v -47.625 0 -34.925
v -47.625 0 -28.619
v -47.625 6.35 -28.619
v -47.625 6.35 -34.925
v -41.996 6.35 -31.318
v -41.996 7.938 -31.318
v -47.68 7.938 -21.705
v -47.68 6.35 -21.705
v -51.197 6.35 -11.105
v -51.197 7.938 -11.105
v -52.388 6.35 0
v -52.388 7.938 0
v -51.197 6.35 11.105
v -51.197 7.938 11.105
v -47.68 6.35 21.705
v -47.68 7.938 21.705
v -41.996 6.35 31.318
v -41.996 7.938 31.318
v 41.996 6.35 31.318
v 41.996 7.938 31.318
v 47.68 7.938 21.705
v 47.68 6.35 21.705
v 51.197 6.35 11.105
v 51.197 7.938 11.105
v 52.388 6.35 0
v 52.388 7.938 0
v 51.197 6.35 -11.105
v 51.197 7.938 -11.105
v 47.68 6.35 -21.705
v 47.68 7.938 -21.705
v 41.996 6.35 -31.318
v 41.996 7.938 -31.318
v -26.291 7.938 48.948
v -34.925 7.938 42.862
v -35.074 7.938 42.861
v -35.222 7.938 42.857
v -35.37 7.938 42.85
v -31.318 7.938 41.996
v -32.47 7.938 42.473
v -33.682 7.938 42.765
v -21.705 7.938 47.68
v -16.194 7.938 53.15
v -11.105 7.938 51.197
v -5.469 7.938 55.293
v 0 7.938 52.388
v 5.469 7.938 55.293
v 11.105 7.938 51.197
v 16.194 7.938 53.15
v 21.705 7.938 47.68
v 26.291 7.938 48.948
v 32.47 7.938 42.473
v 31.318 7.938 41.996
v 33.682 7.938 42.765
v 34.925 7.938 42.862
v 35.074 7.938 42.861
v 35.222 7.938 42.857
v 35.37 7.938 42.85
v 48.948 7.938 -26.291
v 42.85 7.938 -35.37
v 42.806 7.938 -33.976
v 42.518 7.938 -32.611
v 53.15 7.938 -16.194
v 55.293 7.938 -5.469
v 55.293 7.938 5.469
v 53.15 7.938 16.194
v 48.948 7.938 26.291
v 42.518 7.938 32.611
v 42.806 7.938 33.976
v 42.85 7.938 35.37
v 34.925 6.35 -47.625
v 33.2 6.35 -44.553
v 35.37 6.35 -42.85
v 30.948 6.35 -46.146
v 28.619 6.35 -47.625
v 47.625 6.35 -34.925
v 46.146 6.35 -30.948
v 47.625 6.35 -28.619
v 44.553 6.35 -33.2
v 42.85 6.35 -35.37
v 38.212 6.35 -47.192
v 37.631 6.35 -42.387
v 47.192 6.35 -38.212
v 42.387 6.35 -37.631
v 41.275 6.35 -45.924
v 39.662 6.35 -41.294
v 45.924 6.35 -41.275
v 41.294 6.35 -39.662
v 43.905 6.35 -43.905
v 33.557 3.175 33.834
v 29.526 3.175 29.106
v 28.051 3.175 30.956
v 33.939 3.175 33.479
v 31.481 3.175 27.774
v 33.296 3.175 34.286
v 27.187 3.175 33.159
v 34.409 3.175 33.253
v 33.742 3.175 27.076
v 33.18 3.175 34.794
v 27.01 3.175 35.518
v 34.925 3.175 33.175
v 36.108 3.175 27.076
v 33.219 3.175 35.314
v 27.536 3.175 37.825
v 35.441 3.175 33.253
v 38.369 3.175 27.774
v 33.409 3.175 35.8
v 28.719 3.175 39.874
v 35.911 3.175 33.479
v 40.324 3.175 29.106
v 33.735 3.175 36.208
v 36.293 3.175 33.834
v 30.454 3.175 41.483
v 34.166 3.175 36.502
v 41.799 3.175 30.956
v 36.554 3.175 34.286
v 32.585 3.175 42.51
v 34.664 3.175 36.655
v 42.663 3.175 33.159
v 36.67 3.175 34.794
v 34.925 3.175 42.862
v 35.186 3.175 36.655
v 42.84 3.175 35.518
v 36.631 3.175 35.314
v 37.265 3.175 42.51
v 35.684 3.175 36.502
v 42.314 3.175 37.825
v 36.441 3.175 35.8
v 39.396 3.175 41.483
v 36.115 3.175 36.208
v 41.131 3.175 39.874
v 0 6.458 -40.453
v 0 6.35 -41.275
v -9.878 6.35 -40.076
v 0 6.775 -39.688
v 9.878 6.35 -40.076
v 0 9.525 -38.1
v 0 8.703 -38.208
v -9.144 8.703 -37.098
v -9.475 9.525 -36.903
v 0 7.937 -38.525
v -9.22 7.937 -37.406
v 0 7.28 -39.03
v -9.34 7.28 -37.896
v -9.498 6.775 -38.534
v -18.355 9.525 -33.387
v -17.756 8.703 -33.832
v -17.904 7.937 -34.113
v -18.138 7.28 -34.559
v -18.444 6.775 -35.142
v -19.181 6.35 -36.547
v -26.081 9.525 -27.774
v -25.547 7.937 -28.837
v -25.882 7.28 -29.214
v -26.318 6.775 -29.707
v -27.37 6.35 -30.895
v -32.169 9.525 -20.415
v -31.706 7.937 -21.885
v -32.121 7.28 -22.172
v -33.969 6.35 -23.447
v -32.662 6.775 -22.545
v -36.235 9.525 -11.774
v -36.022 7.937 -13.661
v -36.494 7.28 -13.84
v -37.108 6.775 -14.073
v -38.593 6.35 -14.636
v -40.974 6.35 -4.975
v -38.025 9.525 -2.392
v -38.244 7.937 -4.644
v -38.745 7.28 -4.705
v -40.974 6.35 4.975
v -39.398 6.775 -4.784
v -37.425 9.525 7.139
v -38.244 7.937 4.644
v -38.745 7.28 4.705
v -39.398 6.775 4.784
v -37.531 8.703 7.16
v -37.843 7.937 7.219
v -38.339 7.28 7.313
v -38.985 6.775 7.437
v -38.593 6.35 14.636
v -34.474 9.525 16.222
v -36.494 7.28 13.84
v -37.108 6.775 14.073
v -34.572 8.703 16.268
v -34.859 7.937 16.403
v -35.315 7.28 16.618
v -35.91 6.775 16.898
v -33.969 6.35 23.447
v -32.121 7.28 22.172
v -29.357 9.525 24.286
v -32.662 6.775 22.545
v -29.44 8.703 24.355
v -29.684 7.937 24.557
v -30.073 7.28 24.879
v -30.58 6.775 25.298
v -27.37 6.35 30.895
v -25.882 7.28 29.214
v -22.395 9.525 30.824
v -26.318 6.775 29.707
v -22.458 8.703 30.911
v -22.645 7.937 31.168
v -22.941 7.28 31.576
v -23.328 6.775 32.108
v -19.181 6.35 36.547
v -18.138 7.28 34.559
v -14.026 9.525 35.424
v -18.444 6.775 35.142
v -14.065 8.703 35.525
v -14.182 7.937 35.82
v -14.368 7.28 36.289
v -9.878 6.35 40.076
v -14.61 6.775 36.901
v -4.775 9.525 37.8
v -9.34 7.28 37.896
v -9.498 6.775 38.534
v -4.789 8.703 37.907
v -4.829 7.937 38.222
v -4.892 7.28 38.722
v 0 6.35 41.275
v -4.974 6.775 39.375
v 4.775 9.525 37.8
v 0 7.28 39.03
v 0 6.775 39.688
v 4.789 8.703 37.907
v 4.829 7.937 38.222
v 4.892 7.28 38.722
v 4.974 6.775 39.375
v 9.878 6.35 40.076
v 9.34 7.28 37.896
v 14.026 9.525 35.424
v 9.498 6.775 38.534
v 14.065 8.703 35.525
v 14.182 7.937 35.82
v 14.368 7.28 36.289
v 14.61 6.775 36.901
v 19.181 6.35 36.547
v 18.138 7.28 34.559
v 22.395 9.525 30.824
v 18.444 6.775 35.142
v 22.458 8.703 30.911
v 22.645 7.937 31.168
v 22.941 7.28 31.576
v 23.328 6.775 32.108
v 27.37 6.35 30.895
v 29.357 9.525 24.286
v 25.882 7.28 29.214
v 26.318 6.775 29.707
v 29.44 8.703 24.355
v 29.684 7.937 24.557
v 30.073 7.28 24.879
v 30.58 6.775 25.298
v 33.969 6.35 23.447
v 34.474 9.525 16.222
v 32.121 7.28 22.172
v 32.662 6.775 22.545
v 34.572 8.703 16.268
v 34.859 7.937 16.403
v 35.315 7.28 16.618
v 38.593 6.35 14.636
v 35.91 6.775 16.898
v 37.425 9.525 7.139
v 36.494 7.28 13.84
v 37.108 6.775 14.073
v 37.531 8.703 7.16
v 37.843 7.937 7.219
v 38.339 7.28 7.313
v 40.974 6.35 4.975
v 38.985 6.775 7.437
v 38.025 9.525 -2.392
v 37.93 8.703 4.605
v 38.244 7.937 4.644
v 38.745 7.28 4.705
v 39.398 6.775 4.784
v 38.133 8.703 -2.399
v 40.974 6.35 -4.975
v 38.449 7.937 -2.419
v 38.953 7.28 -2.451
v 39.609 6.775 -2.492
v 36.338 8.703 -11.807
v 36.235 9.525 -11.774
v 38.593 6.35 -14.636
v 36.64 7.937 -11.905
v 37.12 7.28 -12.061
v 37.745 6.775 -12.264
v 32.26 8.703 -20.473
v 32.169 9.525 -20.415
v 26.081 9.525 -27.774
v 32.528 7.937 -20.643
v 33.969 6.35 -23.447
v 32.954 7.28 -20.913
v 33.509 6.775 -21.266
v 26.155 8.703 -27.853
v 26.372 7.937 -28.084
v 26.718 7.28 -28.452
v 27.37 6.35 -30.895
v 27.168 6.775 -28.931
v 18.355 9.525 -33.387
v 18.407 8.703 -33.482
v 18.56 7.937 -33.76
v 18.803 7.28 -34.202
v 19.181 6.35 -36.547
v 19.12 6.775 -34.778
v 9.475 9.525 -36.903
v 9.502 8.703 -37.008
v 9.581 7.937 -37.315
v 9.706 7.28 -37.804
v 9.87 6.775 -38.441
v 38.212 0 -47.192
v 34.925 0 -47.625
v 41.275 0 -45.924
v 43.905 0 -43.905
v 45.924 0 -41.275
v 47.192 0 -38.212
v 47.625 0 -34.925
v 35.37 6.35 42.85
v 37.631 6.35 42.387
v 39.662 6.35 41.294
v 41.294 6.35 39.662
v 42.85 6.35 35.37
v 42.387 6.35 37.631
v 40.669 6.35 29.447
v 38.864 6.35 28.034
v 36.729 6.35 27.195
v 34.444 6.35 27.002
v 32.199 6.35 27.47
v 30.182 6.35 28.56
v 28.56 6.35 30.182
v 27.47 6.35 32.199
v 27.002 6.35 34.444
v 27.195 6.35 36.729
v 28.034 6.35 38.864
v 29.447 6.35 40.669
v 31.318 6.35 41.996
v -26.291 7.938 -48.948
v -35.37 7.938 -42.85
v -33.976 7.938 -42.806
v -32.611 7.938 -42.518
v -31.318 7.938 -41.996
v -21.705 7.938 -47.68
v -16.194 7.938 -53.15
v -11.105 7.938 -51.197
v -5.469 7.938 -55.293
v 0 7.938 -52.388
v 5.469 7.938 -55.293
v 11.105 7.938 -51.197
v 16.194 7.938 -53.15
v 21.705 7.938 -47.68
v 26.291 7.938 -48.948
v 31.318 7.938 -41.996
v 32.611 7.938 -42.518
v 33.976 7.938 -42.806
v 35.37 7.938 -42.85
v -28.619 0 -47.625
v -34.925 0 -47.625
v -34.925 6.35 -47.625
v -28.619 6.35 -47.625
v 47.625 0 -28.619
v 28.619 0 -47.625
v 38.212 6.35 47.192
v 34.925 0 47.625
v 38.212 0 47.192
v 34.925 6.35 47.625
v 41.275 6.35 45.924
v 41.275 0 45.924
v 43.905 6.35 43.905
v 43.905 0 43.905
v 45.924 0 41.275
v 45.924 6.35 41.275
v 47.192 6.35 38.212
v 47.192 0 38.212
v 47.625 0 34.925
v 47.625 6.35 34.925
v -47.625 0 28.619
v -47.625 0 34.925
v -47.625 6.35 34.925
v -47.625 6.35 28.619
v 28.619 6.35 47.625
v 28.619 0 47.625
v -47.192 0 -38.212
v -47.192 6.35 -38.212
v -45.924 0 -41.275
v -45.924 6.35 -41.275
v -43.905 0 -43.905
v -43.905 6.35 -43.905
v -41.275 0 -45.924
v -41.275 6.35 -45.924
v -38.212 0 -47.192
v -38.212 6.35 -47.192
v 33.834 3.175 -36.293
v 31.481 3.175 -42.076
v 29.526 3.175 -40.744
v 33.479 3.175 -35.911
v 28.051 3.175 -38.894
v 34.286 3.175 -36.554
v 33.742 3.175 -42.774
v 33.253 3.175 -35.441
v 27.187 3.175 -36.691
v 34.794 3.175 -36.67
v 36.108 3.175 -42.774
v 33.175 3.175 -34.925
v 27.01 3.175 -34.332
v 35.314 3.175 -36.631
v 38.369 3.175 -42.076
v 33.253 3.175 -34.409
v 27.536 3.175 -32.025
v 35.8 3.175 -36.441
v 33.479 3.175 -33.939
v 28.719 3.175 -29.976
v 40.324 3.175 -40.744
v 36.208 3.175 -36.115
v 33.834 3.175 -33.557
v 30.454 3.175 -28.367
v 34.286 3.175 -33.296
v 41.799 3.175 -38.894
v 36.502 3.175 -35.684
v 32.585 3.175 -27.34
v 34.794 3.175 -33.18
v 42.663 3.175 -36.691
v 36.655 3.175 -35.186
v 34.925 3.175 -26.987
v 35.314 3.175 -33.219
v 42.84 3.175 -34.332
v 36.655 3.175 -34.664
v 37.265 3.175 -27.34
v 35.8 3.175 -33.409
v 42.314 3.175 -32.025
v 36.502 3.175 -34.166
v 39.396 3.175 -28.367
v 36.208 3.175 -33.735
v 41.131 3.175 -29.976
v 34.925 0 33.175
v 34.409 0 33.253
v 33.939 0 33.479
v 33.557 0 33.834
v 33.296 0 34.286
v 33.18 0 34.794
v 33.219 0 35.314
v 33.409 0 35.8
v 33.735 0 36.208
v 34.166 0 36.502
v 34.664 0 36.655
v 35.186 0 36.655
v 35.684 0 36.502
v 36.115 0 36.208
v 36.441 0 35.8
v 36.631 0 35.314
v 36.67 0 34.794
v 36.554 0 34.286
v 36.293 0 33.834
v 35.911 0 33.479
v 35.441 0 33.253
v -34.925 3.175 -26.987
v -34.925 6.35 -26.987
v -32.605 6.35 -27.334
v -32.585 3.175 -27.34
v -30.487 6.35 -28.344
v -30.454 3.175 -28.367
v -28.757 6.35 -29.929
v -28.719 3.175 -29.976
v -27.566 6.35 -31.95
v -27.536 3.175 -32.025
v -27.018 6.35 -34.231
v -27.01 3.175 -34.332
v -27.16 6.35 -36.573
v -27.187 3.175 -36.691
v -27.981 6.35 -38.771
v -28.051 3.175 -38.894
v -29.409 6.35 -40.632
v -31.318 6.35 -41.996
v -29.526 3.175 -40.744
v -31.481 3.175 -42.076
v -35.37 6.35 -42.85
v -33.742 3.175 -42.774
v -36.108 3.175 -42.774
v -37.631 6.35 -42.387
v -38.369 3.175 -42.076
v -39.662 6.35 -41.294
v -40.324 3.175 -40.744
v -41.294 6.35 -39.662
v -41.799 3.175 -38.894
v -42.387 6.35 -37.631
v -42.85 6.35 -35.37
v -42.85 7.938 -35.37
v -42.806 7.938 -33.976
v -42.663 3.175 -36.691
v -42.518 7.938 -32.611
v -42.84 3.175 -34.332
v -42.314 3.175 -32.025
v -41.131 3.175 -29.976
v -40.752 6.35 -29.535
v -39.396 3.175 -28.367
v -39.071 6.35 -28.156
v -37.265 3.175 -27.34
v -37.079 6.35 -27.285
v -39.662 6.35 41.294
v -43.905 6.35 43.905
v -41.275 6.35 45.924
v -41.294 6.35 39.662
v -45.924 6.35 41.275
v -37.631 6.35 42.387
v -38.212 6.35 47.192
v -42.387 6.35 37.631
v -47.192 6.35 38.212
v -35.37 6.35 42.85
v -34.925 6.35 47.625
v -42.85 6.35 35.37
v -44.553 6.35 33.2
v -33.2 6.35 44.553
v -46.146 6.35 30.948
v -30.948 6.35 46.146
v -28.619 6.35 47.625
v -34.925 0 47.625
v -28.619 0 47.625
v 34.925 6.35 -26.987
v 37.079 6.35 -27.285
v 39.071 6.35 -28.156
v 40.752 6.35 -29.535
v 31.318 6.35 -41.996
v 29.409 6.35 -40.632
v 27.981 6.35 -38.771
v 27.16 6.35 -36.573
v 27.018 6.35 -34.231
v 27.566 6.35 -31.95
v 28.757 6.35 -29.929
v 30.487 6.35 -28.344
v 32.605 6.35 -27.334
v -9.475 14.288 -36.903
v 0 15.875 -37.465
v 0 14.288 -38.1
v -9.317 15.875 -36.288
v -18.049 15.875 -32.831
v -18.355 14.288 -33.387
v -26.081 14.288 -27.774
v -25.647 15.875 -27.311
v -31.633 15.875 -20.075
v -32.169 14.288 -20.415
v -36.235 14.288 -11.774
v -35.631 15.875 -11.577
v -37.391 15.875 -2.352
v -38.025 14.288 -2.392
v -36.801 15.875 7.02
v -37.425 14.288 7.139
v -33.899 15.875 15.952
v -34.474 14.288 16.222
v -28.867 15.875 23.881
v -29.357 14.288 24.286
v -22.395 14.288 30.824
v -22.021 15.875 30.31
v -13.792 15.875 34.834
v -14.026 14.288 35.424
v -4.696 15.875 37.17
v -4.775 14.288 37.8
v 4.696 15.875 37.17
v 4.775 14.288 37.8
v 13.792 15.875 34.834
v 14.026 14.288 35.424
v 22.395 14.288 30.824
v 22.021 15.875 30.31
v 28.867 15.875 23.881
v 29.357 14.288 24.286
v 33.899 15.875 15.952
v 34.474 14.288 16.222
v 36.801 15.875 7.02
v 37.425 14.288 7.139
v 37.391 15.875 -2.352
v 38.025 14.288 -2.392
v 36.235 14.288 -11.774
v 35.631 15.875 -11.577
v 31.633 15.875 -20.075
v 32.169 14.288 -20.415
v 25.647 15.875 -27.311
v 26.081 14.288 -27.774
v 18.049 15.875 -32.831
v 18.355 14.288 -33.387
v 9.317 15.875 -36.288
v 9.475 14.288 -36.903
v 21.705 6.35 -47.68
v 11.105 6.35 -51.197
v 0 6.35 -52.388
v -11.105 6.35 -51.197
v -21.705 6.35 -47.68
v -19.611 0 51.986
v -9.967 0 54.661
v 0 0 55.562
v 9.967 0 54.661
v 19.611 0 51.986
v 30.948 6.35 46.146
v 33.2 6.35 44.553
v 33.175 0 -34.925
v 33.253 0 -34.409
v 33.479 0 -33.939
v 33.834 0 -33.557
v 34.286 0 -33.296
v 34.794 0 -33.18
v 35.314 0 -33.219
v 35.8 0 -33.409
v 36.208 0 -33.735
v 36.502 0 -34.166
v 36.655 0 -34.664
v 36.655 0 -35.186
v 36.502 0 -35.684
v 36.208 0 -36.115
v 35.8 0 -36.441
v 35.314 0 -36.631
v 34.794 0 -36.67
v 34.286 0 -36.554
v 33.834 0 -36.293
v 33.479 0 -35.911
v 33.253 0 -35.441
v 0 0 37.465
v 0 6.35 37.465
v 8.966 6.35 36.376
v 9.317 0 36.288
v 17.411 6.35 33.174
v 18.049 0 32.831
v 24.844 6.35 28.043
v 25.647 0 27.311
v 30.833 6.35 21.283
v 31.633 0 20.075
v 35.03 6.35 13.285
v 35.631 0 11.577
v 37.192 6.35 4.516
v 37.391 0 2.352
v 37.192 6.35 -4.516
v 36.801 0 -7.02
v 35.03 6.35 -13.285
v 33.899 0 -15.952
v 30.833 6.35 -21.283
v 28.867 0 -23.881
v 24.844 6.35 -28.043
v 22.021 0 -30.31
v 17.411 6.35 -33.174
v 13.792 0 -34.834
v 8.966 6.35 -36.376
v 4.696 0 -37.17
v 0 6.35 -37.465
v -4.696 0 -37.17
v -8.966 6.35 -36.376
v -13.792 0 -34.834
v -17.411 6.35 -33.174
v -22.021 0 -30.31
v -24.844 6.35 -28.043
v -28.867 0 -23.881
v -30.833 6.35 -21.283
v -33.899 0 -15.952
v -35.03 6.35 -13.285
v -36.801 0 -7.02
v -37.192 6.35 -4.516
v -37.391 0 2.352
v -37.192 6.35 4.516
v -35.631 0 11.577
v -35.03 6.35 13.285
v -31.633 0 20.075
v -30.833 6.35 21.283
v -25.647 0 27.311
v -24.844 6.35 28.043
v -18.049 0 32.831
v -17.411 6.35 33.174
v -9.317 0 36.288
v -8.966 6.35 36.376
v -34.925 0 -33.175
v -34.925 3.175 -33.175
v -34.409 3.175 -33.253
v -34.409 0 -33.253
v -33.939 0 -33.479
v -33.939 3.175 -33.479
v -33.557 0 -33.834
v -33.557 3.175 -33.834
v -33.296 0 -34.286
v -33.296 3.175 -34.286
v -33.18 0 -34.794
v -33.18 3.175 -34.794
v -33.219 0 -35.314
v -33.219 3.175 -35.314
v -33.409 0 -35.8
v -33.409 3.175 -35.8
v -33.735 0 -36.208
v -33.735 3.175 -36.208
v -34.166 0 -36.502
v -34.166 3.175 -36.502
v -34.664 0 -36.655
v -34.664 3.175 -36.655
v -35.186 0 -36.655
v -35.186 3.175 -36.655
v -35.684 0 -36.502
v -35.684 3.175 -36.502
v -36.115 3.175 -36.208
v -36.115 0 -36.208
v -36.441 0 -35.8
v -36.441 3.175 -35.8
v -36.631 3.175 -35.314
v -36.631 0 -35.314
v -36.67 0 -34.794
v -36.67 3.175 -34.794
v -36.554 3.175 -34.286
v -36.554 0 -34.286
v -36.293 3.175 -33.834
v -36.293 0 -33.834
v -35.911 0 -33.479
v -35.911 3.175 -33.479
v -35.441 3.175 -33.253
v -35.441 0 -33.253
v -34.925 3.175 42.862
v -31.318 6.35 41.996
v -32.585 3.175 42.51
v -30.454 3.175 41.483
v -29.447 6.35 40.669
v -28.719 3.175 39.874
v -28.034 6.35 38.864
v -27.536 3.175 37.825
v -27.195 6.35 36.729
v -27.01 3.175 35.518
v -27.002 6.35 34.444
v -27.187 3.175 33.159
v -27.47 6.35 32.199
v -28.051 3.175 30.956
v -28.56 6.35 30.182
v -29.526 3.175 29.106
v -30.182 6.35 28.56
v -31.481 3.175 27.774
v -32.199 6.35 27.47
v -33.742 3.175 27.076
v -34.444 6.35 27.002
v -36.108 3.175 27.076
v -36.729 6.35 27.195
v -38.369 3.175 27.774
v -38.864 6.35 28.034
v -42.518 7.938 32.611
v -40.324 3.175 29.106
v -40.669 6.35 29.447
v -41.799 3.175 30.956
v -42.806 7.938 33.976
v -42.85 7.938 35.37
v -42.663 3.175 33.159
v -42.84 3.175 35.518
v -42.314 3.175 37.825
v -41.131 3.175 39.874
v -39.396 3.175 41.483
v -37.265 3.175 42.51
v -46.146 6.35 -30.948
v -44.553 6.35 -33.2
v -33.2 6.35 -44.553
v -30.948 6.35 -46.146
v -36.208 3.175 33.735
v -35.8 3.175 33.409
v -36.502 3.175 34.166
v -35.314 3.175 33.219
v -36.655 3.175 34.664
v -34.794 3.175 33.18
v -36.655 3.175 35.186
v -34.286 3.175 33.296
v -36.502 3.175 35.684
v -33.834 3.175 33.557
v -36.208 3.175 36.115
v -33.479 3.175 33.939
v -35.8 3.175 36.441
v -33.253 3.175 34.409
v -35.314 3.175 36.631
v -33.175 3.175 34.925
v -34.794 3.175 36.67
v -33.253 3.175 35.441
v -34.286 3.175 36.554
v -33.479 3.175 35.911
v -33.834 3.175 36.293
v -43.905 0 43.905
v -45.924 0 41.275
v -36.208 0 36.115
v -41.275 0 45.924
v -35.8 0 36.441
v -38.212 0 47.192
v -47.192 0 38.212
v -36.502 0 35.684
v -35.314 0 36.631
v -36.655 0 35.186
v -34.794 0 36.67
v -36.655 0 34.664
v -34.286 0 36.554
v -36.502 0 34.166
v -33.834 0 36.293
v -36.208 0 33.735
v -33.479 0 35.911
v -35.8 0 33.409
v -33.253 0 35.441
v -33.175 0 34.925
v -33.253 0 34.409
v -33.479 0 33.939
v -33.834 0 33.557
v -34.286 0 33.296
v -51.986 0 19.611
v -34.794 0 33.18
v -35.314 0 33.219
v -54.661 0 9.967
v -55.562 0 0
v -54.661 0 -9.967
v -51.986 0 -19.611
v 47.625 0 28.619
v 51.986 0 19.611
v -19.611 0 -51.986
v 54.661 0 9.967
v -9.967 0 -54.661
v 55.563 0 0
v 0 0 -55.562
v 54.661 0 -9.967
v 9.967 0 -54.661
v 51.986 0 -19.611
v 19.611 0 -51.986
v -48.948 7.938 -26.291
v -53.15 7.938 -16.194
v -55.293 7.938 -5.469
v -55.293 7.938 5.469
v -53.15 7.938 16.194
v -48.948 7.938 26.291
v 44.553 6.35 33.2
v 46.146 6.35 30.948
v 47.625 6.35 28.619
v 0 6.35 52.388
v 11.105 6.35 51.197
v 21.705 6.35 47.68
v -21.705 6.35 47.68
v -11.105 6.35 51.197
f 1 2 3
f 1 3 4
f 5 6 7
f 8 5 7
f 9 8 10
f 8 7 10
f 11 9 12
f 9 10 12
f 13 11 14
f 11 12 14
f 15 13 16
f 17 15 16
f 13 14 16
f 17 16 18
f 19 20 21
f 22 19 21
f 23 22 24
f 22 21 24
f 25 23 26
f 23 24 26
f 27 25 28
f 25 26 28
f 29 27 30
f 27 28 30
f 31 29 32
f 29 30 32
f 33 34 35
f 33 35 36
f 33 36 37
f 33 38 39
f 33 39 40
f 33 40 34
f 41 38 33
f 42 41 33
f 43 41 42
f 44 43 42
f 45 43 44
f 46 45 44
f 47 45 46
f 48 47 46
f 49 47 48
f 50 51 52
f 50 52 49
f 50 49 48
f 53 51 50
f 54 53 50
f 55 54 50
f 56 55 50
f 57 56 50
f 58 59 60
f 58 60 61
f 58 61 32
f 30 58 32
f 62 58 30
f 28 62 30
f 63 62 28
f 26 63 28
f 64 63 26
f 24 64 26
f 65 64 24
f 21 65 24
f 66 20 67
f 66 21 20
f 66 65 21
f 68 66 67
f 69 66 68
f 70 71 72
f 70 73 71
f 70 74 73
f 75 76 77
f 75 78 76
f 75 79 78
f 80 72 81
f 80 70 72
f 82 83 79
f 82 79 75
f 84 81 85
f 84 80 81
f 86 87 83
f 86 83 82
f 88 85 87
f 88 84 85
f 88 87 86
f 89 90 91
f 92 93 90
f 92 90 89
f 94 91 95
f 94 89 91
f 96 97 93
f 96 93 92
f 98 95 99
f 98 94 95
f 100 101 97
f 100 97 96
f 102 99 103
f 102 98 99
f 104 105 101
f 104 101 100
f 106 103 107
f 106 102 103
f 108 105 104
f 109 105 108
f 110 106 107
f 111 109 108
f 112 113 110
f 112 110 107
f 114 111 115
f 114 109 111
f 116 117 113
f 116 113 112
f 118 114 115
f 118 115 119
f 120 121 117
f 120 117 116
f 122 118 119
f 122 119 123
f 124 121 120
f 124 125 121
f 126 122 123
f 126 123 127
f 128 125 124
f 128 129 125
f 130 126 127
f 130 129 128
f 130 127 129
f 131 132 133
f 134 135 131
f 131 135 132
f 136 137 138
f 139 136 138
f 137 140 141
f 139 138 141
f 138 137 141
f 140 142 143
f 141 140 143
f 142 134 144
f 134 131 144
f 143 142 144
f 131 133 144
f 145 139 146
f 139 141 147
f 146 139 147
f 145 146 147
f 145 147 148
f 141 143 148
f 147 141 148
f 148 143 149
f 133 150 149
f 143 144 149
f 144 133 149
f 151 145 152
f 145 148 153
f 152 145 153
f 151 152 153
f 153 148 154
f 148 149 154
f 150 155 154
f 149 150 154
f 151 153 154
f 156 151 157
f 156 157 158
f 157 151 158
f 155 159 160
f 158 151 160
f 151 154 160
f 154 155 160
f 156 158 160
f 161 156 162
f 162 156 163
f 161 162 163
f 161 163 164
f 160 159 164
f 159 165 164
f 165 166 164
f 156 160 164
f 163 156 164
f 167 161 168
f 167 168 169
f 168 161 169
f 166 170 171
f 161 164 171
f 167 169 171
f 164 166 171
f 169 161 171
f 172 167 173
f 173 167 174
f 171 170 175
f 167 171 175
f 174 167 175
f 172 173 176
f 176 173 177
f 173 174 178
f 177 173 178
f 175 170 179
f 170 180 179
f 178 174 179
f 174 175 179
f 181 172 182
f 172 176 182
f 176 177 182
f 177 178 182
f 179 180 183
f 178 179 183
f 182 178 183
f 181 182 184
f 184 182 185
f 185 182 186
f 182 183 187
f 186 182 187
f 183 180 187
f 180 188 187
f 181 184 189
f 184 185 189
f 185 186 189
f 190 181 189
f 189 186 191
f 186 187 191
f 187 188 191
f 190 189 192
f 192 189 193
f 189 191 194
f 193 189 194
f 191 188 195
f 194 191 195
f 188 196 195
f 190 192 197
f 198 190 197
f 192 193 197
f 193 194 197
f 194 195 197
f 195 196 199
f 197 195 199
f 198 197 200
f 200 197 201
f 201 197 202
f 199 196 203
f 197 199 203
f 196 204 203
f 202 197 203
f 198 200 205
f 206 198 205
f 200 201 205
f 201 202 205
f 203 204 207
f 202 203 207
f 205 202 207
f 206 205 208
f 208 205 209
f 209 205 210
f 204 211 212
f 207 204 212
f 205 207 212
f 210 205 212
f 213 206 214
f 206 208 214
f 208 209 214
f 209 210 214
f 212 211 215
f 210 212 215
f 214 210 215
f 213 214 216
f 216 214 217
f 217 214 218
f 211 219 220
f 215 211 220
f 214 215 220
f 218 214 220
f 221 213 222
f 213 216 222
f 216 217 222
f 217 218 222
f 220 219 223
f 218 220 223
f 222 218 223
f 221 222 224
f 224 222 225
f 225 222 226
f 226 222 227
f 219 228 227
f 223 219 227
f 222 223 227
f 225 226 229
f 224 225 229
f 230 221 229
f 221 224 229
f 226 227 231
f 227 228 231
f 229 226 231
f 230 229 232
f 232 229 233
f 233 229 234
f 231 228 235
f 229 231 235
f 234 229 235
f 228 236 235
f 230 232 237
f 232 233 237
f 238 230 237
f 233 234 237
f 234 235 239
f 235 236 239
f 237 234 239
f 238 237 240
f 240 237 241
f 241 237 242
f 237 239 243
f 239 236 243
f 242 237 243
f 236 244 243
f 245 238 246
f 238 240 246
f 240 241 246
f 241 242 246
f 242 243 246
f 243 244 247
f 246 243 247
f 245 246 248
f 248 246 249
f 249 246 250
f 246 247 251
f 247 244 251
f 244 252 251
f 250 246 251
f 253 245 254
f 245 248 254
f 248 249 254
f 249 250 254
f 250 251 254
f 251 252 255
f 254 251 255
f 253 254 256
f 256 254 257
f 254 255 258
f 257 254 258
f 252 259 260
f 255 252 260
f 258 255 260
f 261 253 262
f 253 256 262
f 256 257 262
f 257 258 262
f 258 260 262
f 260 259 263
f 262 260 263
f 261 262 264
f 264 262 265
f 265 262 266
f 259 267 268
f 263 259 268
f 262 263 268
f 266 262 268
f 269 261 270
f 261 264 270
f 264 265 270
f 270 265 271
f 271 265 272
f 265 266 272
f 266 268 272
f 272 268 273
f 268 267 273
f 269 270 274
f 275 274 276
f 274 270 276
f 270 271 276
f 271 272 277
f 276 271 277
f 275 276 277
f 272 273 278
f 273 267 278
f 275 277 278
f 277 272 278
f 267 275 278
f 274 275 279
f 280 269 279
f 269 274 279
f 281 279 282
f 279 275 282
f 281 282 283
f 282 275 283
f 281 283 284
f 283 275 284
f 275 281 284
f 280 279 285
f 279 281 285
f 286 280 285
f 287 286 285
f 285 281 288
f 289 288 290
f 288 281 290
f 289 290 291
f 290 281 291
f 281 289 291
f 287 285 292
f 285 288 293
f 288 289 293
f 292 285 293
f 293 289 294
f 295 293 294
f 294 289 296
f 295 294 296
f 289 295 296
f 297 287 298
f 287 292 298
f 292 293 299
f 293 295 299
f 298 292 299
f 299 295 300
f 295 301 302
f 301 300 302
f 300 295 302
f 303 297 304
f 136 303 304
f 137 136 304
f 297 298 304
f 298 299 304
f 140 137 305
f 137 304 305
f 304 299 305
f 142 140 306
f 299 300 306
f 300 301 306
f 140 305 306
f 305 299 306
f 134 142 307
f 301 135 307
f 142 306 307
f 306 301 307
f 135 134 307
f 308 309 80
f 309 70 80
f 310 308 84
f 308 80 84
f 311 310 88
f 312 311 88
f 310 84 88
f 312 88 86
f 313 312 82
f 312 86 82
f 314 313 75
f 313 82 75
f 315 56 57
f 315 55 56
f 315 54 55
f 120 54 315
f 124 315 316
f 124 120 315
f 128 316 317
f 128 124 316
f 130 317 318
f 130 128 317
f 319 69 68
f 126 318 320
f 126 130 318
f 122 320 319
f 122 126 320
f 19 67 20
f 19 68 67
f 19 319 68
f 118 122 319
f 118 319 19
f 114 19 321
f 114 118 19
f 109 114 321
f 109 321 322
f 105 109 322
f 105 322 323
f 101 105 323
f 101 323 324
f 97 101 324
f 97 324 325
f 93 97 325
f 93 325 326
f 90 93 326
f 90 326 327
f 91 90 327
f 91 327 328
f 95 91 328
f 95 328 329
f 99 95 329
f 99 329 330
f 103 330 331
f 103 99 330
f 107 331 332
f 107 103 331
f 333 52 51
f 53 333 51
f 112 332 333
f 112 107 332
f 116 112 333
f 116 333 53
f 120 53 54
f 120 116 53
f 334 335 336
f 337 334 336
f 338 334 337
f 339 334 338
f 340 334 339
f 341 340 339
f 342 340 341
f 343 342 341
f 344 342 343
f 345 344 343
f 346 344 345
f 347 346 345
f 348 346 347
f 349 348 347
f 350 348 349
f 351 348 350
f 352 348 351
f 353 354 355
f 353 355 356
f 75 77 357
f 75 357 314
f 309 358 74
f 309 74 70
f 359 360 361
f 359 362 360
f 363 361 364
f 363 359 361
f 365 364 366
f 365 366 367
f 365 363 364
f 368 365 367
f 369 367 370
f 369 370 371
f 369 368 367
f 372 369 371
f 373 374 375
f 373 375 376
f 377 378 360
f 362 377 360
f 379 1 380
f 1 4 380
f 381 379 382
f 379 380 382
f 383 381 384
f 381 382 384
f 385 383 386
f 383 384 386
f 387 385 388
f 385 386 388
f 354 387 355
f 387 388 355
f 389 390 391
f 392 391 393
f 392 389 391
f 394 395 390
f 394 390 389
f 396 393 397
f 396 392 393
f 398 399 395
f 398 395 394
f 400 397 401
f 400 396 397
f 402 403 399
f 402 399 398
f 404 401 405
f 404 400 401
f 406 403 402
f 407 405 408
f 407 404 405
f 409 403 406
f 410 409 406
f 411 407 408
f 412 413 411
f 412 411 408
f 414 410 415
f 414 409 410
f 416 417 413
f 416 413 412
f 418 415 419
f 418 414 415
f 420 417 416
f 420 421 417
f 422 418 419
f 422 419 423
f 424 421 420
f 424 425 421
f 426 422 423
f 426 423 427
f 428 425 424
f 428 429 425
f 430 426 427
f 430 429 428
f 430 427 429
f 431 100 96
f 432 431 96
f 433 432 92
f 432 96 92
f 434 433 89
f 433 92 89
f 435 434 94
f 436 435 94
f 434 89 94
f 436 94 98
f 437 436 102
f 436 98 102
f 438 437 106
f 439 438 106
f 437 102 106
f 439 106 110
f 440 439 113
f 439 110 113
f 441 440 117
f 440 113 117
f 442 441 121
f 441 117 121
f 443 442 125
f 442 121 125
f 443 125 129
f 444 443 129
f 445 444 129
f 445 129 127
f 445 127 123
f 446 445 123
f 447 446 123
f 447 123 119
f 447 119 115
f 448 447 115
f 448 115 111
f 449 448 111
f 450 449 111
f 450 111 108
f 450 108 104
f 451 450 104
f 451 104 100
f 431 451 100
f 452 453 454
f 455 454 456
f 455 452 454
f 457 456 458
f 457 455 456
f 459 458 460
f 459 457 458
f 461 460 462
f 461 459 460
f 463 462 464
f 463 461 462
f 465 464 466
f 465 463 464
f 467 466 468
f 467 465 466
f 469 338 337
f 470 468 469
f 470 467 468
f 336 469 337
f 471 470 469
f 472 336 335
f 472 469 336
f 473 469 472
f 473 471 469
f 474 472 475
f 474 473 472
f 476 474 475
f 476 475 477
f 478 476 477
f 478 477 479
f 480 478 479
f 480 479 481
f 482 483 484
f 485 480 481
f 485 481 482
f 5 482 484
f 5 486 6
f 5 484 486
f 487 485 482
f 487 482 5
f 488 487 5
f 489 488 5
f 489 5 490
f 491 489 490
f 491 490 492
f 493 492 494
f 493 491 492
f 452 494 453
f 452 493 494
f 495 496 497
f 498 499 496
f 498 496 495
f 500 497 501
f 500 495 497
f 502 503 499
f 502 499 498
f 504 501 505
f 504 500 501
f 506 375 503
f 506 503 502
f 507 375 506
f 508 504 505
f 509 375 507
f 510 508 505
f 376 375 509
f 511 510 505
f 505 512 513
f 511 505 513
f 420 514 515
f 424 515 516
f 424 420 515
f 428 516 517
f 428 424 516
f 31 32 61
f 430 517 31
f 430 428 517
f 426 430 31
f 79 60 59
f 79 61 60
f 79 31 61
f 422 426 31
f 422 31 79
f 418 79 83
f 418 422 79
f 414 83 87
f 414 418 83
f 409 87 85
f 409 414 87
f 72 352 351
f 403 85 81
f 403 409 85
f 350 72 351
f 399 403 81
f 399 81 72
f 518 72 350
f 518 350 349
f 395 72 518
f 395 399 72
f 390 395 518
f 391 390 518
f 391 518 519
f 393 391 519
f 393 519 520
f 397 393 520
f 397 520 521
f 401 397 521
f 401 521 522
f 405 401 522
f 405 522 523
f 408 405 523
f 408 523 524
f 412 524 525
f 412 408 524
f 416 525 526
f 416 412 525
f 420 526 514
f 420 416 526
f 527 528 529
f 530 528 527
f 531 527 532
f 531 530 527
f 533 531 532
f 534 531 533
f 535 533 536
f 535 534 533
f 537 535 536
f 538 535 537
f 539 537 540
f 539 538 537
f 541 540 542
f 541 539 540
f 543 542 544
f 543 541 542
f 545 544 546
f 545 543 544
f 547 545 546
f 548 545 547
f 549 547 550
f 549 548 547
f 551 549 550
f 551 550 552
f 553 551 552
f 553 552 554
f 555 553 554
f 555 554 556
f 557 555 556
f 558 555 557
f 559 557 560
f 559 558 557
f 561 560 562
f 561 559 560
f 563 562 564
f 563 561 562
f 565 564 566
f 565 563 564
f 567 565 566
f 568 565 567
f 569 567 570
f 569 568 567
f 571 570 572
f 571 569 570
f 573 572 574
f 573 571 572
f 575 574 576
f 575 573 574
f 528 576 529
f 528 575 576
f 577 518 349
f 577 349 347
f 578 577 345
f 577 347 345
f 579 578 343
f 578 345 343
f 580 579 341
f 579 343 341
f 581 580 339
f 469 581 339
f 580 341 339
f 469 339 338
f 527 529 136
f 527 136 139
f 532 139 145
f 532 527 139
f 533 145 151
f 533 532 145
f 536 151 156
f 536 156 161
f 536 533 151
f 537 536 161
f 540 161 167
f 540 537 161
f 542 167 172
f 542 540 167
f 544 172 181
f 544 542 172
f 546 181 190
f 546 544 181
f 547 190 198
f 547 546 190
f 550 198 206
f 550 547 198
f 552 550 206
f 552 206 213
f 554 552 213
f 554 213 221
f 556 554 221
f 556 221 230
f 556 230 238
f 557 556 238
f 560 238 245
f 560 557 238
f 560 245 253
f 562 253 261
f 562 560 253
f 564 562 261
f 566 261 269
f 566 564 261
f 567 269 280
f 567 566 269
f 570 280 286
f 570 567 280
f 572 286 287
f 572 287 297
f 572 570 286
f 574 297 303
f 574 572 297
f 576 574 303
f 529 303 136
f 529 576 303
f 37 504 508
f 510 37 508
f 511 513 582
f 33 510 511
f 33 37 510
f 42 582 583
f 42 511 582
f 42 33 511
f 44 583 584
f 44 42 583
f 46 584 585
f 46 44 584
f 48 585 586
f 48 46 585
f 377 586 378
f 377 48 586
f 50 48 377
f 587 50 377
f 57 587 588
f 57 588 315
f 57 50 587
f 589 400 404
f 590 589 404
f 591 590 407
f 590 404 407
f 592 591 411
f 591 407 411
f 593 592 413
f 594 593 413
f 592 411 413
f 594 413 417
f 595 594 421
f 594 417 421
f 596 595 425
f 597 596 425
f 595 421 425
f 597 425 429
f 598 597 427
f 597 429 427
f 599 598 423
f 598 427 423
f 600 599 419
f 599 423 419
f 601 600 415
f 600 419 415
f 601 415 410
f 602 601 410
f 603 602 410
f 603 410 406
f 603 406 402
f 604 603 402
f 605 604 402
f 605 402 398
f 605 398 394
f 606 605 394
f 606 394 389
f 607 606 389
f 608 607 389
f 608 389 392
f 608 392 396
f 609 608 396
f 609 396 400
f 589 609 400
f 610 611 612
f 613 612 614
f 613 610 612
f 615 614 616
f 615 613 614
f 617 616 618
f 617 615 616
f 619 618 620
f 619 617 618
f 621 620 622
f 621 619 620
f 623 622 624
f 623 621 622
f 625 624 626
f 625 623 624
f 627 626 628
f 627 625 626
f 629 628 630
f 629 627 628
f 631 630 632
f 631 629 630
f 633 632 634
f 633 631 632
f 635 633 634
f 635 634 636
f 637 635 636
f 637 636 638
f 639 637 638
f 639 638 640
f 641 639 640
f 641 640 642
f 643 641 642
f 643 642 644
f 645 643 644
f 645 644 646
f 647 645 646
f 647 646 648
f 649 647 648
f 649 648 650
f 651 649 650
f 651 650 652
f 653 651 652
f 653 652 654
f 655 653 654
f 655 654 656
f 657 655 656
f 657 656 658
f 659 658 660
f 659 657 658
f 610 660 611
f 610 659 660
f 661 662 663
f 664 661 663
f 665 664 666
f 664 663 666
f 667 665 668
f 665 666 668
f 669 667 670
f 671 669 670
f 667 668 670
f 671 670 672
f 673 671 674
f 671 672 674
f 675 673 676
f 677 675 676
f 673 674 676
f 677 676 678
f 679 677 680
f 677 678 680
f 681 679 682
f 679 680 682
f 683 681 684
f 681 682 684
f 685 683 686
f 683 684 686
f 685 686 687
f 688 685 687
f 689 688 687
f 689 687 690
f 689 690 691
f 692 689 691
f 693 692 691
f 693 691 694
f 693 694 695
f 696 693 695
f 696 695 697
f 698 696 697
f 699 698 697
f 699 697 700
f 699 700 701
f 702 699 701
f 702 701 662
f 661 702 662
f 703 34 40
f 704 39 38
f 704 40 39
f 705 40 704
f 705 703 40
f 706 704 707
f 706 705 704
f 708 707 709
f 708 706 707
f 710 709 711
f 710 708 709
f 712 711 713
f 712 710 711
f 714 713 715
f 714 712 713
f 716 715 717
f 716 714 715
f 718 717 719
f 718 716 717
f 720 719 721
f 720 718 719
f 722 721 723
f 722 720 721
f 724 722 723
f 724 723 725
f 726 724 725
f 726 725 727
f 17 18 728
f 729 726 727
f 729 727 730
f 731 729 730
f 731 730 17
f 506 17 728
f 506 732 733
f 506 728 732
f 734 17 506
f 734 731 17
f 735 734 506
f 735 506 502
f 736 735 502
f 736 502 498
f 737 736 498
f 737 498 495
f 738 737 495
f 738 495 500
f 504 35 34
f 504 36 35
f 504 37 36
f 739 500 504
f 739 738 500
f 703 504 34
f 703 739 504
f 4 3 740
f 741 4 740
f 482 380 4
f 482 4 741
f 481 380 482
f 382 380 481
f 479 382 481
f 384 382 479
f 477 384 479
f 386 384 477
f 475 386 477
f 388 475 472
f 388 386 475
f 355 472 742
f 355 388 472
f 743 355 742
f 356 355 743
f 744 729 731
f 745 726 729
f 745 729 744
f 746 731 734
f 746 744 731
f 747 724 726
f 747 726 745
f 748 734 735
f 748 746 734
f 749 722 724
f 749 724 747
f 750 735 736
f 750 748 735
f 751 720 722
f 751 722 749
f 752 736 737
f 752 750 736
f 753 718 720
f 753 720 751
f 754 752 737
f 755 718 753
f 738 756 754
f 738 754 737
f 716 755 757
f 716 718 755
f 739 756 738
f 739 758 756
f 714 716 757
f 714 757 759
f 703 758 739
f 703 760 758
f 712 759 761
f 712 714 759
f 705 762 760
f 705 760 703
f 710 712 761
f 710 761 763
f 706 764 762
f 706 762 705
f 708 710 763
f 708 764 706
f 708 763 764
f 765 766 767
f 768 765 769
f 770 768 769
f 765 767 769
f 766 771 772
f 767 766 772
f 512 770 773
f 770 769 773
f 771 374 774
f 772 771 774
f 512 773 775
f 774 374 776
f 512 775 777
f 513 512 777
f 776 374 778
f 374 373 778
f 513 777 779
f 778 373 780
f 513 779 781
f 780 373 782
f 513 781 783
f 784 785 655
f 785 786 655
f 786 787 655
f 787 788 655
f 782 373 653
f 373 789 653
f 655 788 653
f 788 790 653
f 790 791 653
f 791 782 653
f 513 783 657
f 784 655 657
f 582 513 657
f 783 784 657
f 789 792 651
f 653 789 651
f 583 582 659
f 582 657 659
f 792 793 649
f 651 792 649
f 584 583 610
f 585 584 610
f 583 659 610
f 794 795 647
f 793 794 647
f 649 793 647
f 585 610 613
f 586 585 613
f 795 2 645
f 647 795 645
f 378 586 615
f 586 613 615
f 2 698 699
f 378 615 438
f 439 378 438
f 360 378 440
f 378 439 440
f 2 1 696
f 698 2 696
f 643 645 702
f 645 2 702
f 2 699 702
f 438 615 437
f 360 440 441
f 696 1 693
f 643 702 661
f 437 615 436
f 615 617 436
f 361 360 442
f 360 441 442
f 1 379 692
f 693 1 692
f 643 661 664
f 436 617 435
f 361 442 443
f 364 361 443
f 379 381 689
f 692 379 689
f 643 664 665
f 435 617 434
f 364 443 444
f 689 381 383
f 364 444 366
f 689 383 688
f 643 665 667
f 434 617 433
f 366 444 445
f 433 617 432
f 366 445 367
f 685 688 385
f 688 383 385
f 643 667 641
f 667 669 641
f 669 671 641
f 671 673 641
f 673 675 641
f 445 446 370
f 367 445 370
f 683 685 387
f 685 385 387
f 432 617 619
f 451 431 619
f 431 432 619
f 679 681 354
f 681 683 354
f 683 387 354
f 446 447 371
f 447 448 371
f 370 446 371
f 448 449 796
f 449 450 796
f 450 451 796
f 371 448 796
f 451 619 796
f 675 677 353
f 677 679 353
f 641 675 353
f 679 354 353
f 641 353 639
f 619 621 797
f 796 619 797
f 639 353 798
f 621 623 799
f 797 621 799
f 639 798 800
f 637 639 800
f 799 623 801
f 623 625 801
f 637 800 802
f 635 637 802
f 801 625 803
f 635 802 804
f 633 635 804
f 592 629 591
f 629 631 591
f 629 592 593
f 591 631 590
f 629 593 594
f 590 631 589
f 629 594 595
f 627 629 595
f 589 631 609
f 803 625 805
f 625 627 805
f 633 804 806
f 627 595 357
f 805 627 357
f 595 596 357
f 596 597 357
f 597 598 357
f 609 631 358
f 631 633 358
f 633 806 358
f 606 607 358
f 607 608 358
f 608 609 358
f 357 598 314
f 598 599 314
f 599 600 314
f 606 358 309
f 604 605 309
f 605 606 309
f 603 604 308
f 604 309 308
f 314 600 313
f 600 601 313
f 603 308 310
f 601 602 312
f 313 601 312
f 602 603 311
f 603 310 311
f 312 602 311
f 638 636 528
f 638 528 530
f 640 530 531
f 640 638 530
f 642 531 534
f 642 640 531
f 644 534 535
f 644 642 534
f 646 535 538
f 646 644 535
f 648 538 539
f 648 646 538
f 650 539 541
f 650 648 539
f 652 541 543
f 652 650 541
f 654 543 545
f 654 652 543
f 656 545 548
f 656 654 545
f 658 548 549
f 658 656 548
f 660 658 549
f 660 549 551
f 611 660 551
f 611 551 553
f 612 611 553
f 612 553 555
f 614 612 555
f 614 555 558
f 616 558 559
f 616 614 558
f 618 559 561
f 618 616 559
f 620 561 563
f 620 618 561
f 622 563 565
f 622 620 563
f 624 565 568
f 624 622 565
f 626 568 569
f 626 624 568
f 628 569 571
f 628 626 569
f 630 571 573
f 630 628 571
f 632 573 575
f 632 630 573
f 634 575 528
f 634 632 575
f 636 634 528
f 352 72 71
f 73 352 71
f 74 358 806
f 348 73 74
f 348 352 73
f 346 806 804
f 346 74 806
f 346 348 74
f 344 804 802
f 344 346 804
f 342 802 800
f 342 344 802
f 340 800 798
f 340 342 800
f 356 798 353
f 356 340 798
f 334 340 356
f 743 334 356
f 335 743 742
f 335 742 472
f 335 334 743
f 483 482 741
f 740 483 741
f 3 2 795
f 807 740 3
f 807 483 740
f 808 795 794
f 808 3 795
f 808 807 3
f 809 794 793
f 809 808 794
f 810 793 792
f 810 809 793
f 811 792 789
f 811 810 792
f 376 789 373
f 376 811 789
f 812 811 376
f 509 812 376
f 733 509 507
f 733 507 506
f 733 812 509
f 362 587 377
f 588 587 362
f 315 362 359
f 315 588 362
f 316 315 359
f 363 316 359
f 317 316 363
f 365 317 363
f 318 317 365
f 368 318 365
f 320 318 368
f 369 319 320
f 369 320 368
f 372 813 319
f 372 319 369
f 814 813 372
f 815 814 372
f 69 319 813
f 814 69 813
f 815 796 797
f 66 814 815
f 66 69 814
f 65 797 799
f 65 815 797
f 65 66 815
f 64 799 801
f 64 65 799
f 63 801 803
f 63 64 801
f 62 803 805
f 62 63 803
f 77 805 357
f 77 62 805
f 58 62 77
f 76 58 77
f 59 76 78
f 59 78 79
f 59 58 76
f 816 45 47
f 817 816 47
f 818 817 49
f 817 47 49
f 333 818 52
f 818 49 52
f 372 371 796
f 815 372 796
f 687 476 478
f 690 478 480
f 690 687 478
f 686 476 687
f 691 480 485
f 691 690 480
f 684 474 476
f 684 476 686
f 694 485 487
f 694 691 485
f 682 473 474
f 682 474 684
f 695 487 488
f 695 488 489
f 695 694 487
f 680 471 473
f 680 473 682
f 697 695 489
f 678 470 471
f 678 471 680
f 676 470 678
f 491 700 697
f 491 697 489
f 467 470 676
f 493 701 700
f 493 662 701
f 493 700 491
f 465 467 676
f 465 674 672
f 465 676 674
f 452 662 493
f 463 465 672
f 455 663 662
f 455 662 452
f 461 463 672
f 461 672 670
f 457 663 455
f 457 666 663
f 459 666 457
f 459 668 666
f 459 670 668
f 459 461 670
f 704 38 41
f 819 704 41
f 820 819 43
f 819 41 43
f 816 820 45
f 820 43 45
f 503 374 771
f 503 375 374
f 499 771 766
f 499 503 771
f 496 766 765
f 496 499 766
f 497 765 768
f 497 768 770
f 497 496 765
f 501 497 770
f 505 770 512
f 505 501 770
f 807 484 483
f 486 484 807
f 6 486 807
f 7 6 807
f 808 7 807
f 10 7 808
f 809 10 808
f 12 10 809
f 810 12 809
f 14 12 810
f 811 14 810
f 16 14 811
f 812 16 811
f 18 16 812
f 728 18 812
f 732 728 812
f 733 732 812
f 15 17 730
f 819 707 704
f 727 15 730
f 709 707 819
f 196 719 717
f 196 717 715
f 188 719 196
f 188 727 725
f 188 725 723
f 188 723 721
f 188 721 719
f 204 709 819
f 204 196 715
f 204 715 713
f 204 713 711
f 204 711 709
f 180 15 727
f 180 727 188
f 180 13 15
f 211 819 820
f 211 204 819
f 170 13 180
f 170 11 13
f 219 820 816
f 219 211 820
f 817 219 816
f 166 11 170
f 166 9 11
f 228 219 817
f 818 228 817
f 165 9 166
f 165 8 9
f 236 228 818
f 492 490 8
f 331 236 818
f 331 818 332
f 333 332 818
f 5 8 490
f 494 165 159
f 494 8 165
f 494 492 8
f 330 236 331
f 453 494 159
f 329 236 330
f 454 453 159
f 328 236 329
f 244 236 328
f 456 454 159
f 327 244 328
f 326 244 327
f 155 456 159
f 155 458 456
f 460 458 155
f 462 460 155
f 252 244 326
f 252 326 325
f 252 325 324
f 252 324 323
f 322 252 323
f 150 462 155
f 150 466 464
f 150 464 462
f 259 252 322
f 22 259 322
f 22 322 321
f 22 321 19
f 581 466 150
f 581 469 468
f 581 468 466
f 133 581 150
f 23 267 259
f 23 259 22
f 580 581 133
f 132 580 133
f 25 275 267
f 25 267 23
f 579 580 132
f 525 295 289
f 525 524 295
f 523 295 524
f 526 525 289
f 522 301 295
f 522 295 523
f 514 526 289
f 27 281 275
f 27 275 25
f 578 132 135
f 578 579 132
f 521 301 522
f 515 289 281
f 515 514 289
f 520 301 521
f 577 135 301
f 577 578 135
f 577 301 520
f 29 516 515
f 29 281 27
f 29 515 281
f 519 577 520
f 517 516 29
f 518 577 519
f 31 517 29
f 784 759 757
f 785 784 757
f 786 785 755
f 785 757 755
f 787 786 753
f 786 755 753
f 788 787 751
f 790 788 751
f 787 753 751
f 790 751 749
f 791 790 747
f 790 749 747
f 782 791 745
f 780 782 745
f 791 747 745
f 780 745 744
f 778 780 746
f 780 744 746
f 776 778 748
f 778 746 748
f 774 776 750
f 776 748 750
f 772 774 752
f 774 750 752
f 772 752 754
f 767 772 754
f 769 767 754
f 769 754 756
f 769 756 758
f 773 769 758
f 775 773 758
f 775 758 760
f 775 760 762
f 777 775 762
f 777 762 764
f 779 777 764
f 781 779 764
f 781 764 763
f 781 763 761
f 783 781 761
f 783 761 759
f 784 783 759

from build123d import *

# Parameters (mm, degrees)
SKETCH1_W               = 95.25
SKETCH1_H               = 95.25
SKETCH1_R               = 37.465
BOSS_EXTRUDE1_DEPTH     = 6.35
SKETCH2_R               = 1.75
CUT_EXTRUDE1_DEPTH      = 68.650600515
CIRPATTERN1_COUNT       = 4
FILLET1_R               = 12.7
FILLET2_R               = 3.175
SKETCH5_R               = 55.5625
SKETCH5_R_2             = 44.45
SKETCH5_R_3             = 1.75
BOSS_EXTRUDE2_DEPTH     = 6.35
BOSS_EXTRUDE4_START     = 1.5875
SKETCH8_R               = 55.5625
SKETCH8_R_2             = 52.3875
BOSS_EXTRUDE4_DEPTH     = 1.5875
CUT_EXTRUDE3_DEPTH      = 80.152437976
CUT_EXTRUDE3_DEPTH_BACK = 3.175
SKETCH10_R              = 7.9375


with BuildPart() as part:
    # Sketch1 → Boss-Extrude1 (new body)
    with BuildSketch(Plane(origin=(0, 0, 0), x_dir=(1, 0, 0), z_dir=(0, 1, 0))):
        Rectangle(SKETCH1_W, SKETCH1_H)
        with Locations(Location((0, 0, 0), (0, 0, 270))):
            Circle(SKETCH1_R, mode=Mode.SUBTRACT)
    extrude(amount=BOSS_EXTRUDE1_DEPTH)

    # Sketch2 → Cut-Extrude1 (cut, through all)
    with BuildSketch(Plane(origin=(0, 6.35, 0), x_dir=(1, 0, 0), z_dir=(0, 1, 0))):
        with Locations(Location((-34.925, 34.925, 0), (0, 0, 270))):
            Circle(SKETCH2_R)
    cut_extrude1 = extrude(amount=-CUT_EXTRUDE1_DEPTH, mode=Mode.SUBTRACT)

    # CirPattern1: Cut-Extrude1 ×4 about axis
    cirpattern1_axis = Axis((0, 0, 0), (0, 1, 0))
    for i in range(1, CIRPATTERN1_COUNT):
        add(cut_extrude1.rotate(cirpattern1_axis, i * 360 / CIRPATTERN1_COUNT), mode=Mode.SUBTRACT)

    # Fillet1
    fillet1_edges = [part.edges().sort_by_distance(p)[0] for p in [
        (-47.625, 3.175, -47.625),
        (47.625, 3.175, -47.625),
        (47.625, 3.175, 47.625),
        (-47.625, 3.175, 47.625),
    ]]
    fillet(fillet1_edges, radius=FILLET1_R)

    # Sketch4 → Revolve1 (revolve)
    with BuildSketch(Plane.XY, mode=Mode.PRIVATE) as revolve1_sk:
        Polygon((37.465, 12.7), (37.465, 6.35), (38.1, 6.35), (38.1, 10.3505), (38.1, 14.2875), (37.465, 15.875), align=None)
    revolve(revolve1_sk.sketch.rotate(Axis((0, 0, 0), (0, 1, 0)), 90), axis=Axis((0, 0, 0), (0, 1, 0)))

    # Fillet2
    fillet2_edges = [part.edges().sort_by_distance(p)[0] for p in [
        (0, 6.35, 38.1),
    ]]
    fillet(fillet2_edges, radius=FILLET2_R)

    # Sketch5 → Boss-Extrude2 (add, through all)
    with BuildSketch(Plane(origin=(0, 6.35, 0), x_dir=(1, 0, 0), z_dir=(0, 1, 0))):
        Circle(SKETCH5_R)
        Circle(SKETCH5_R_2, mode=Mode.SUBTRACT)
        with Locations(Location((-34.925, 34.925, 0), (0, 0, 270))):
            Circle(SKETCH5_R_3, mode=Mode.SUBTRACT)
        with Locations((-34.925, -34.925)):
            Circle(SKETCH5_R_3, mode=Mode.SUBTRACT)
        with Locations(Location((34.925, -34.925, 0), (0, 0, 90))):
            Circle(SKETCH5_R_3, mode=Mode.SUBTRACT)
        with Locations(Location((34.925, 34.925, 0), (0, 0, 180))):
            Circle(SKETCH5_R_3, mode=Mode.SUBTRACT)
    extrude(amount=-BOSS_EXTRUDE2_DEPTH)

    # Sketch8 → Boss-Extrude4 (add)
    with BuildSketch(Plane(origin=(0, 6.35, 0), x_dir=(1, 0, 0), z_dir=(0, 1, 0)).offset(BOSS_EXTRUDE4_START)):
        with Locations(Location((0, 0, 0), (0, 0, 270))):
            Circle(SKETCH8_R)
        with Locations(Location((0, 0, 0), (0, 0, 270))):
            Circle(SKETCH8_R_2, mode=Mode.SUBTRACT)
    extrude(amount=-BOSS_EXTRUDE4_DEPTH)

    # Sketch10 → Cut-Extrude3 (cut, two sides: drawn at the far end of the back side and taken through both)
    with BuildSketch(Plane(origin=(0, 6.35, 0), x_dir=(1, 0, 0), z_dir=(0, 1, 0)).offset(-CUT_EXTRUDE3_DEPTH_BACK)):
        with Locations(Location((-34.925, 34.925, 0), (0, 0, 270))):
            Circle(SKETCH10_R)
        with Locations(Location((34.925, 34.925, 0), (0, 0, 270))):
            Circle(SKETCH10_R)
        with Locations(Location((34.925, -34.925, 0), (0, 0, 270))):
            Circle(SKETCH10_R)
        with Locations(Location((-34.925, -34.925, 0), (0, 0, 270))):
            Circle(SKETCH10_R)
    extrude(amount=CUT_EXTRUDE3_DEPTH + CUT_EXTRUDE3_DEPTH_BACK, mode=Mode.SUBTRACT)


solid = part.part
